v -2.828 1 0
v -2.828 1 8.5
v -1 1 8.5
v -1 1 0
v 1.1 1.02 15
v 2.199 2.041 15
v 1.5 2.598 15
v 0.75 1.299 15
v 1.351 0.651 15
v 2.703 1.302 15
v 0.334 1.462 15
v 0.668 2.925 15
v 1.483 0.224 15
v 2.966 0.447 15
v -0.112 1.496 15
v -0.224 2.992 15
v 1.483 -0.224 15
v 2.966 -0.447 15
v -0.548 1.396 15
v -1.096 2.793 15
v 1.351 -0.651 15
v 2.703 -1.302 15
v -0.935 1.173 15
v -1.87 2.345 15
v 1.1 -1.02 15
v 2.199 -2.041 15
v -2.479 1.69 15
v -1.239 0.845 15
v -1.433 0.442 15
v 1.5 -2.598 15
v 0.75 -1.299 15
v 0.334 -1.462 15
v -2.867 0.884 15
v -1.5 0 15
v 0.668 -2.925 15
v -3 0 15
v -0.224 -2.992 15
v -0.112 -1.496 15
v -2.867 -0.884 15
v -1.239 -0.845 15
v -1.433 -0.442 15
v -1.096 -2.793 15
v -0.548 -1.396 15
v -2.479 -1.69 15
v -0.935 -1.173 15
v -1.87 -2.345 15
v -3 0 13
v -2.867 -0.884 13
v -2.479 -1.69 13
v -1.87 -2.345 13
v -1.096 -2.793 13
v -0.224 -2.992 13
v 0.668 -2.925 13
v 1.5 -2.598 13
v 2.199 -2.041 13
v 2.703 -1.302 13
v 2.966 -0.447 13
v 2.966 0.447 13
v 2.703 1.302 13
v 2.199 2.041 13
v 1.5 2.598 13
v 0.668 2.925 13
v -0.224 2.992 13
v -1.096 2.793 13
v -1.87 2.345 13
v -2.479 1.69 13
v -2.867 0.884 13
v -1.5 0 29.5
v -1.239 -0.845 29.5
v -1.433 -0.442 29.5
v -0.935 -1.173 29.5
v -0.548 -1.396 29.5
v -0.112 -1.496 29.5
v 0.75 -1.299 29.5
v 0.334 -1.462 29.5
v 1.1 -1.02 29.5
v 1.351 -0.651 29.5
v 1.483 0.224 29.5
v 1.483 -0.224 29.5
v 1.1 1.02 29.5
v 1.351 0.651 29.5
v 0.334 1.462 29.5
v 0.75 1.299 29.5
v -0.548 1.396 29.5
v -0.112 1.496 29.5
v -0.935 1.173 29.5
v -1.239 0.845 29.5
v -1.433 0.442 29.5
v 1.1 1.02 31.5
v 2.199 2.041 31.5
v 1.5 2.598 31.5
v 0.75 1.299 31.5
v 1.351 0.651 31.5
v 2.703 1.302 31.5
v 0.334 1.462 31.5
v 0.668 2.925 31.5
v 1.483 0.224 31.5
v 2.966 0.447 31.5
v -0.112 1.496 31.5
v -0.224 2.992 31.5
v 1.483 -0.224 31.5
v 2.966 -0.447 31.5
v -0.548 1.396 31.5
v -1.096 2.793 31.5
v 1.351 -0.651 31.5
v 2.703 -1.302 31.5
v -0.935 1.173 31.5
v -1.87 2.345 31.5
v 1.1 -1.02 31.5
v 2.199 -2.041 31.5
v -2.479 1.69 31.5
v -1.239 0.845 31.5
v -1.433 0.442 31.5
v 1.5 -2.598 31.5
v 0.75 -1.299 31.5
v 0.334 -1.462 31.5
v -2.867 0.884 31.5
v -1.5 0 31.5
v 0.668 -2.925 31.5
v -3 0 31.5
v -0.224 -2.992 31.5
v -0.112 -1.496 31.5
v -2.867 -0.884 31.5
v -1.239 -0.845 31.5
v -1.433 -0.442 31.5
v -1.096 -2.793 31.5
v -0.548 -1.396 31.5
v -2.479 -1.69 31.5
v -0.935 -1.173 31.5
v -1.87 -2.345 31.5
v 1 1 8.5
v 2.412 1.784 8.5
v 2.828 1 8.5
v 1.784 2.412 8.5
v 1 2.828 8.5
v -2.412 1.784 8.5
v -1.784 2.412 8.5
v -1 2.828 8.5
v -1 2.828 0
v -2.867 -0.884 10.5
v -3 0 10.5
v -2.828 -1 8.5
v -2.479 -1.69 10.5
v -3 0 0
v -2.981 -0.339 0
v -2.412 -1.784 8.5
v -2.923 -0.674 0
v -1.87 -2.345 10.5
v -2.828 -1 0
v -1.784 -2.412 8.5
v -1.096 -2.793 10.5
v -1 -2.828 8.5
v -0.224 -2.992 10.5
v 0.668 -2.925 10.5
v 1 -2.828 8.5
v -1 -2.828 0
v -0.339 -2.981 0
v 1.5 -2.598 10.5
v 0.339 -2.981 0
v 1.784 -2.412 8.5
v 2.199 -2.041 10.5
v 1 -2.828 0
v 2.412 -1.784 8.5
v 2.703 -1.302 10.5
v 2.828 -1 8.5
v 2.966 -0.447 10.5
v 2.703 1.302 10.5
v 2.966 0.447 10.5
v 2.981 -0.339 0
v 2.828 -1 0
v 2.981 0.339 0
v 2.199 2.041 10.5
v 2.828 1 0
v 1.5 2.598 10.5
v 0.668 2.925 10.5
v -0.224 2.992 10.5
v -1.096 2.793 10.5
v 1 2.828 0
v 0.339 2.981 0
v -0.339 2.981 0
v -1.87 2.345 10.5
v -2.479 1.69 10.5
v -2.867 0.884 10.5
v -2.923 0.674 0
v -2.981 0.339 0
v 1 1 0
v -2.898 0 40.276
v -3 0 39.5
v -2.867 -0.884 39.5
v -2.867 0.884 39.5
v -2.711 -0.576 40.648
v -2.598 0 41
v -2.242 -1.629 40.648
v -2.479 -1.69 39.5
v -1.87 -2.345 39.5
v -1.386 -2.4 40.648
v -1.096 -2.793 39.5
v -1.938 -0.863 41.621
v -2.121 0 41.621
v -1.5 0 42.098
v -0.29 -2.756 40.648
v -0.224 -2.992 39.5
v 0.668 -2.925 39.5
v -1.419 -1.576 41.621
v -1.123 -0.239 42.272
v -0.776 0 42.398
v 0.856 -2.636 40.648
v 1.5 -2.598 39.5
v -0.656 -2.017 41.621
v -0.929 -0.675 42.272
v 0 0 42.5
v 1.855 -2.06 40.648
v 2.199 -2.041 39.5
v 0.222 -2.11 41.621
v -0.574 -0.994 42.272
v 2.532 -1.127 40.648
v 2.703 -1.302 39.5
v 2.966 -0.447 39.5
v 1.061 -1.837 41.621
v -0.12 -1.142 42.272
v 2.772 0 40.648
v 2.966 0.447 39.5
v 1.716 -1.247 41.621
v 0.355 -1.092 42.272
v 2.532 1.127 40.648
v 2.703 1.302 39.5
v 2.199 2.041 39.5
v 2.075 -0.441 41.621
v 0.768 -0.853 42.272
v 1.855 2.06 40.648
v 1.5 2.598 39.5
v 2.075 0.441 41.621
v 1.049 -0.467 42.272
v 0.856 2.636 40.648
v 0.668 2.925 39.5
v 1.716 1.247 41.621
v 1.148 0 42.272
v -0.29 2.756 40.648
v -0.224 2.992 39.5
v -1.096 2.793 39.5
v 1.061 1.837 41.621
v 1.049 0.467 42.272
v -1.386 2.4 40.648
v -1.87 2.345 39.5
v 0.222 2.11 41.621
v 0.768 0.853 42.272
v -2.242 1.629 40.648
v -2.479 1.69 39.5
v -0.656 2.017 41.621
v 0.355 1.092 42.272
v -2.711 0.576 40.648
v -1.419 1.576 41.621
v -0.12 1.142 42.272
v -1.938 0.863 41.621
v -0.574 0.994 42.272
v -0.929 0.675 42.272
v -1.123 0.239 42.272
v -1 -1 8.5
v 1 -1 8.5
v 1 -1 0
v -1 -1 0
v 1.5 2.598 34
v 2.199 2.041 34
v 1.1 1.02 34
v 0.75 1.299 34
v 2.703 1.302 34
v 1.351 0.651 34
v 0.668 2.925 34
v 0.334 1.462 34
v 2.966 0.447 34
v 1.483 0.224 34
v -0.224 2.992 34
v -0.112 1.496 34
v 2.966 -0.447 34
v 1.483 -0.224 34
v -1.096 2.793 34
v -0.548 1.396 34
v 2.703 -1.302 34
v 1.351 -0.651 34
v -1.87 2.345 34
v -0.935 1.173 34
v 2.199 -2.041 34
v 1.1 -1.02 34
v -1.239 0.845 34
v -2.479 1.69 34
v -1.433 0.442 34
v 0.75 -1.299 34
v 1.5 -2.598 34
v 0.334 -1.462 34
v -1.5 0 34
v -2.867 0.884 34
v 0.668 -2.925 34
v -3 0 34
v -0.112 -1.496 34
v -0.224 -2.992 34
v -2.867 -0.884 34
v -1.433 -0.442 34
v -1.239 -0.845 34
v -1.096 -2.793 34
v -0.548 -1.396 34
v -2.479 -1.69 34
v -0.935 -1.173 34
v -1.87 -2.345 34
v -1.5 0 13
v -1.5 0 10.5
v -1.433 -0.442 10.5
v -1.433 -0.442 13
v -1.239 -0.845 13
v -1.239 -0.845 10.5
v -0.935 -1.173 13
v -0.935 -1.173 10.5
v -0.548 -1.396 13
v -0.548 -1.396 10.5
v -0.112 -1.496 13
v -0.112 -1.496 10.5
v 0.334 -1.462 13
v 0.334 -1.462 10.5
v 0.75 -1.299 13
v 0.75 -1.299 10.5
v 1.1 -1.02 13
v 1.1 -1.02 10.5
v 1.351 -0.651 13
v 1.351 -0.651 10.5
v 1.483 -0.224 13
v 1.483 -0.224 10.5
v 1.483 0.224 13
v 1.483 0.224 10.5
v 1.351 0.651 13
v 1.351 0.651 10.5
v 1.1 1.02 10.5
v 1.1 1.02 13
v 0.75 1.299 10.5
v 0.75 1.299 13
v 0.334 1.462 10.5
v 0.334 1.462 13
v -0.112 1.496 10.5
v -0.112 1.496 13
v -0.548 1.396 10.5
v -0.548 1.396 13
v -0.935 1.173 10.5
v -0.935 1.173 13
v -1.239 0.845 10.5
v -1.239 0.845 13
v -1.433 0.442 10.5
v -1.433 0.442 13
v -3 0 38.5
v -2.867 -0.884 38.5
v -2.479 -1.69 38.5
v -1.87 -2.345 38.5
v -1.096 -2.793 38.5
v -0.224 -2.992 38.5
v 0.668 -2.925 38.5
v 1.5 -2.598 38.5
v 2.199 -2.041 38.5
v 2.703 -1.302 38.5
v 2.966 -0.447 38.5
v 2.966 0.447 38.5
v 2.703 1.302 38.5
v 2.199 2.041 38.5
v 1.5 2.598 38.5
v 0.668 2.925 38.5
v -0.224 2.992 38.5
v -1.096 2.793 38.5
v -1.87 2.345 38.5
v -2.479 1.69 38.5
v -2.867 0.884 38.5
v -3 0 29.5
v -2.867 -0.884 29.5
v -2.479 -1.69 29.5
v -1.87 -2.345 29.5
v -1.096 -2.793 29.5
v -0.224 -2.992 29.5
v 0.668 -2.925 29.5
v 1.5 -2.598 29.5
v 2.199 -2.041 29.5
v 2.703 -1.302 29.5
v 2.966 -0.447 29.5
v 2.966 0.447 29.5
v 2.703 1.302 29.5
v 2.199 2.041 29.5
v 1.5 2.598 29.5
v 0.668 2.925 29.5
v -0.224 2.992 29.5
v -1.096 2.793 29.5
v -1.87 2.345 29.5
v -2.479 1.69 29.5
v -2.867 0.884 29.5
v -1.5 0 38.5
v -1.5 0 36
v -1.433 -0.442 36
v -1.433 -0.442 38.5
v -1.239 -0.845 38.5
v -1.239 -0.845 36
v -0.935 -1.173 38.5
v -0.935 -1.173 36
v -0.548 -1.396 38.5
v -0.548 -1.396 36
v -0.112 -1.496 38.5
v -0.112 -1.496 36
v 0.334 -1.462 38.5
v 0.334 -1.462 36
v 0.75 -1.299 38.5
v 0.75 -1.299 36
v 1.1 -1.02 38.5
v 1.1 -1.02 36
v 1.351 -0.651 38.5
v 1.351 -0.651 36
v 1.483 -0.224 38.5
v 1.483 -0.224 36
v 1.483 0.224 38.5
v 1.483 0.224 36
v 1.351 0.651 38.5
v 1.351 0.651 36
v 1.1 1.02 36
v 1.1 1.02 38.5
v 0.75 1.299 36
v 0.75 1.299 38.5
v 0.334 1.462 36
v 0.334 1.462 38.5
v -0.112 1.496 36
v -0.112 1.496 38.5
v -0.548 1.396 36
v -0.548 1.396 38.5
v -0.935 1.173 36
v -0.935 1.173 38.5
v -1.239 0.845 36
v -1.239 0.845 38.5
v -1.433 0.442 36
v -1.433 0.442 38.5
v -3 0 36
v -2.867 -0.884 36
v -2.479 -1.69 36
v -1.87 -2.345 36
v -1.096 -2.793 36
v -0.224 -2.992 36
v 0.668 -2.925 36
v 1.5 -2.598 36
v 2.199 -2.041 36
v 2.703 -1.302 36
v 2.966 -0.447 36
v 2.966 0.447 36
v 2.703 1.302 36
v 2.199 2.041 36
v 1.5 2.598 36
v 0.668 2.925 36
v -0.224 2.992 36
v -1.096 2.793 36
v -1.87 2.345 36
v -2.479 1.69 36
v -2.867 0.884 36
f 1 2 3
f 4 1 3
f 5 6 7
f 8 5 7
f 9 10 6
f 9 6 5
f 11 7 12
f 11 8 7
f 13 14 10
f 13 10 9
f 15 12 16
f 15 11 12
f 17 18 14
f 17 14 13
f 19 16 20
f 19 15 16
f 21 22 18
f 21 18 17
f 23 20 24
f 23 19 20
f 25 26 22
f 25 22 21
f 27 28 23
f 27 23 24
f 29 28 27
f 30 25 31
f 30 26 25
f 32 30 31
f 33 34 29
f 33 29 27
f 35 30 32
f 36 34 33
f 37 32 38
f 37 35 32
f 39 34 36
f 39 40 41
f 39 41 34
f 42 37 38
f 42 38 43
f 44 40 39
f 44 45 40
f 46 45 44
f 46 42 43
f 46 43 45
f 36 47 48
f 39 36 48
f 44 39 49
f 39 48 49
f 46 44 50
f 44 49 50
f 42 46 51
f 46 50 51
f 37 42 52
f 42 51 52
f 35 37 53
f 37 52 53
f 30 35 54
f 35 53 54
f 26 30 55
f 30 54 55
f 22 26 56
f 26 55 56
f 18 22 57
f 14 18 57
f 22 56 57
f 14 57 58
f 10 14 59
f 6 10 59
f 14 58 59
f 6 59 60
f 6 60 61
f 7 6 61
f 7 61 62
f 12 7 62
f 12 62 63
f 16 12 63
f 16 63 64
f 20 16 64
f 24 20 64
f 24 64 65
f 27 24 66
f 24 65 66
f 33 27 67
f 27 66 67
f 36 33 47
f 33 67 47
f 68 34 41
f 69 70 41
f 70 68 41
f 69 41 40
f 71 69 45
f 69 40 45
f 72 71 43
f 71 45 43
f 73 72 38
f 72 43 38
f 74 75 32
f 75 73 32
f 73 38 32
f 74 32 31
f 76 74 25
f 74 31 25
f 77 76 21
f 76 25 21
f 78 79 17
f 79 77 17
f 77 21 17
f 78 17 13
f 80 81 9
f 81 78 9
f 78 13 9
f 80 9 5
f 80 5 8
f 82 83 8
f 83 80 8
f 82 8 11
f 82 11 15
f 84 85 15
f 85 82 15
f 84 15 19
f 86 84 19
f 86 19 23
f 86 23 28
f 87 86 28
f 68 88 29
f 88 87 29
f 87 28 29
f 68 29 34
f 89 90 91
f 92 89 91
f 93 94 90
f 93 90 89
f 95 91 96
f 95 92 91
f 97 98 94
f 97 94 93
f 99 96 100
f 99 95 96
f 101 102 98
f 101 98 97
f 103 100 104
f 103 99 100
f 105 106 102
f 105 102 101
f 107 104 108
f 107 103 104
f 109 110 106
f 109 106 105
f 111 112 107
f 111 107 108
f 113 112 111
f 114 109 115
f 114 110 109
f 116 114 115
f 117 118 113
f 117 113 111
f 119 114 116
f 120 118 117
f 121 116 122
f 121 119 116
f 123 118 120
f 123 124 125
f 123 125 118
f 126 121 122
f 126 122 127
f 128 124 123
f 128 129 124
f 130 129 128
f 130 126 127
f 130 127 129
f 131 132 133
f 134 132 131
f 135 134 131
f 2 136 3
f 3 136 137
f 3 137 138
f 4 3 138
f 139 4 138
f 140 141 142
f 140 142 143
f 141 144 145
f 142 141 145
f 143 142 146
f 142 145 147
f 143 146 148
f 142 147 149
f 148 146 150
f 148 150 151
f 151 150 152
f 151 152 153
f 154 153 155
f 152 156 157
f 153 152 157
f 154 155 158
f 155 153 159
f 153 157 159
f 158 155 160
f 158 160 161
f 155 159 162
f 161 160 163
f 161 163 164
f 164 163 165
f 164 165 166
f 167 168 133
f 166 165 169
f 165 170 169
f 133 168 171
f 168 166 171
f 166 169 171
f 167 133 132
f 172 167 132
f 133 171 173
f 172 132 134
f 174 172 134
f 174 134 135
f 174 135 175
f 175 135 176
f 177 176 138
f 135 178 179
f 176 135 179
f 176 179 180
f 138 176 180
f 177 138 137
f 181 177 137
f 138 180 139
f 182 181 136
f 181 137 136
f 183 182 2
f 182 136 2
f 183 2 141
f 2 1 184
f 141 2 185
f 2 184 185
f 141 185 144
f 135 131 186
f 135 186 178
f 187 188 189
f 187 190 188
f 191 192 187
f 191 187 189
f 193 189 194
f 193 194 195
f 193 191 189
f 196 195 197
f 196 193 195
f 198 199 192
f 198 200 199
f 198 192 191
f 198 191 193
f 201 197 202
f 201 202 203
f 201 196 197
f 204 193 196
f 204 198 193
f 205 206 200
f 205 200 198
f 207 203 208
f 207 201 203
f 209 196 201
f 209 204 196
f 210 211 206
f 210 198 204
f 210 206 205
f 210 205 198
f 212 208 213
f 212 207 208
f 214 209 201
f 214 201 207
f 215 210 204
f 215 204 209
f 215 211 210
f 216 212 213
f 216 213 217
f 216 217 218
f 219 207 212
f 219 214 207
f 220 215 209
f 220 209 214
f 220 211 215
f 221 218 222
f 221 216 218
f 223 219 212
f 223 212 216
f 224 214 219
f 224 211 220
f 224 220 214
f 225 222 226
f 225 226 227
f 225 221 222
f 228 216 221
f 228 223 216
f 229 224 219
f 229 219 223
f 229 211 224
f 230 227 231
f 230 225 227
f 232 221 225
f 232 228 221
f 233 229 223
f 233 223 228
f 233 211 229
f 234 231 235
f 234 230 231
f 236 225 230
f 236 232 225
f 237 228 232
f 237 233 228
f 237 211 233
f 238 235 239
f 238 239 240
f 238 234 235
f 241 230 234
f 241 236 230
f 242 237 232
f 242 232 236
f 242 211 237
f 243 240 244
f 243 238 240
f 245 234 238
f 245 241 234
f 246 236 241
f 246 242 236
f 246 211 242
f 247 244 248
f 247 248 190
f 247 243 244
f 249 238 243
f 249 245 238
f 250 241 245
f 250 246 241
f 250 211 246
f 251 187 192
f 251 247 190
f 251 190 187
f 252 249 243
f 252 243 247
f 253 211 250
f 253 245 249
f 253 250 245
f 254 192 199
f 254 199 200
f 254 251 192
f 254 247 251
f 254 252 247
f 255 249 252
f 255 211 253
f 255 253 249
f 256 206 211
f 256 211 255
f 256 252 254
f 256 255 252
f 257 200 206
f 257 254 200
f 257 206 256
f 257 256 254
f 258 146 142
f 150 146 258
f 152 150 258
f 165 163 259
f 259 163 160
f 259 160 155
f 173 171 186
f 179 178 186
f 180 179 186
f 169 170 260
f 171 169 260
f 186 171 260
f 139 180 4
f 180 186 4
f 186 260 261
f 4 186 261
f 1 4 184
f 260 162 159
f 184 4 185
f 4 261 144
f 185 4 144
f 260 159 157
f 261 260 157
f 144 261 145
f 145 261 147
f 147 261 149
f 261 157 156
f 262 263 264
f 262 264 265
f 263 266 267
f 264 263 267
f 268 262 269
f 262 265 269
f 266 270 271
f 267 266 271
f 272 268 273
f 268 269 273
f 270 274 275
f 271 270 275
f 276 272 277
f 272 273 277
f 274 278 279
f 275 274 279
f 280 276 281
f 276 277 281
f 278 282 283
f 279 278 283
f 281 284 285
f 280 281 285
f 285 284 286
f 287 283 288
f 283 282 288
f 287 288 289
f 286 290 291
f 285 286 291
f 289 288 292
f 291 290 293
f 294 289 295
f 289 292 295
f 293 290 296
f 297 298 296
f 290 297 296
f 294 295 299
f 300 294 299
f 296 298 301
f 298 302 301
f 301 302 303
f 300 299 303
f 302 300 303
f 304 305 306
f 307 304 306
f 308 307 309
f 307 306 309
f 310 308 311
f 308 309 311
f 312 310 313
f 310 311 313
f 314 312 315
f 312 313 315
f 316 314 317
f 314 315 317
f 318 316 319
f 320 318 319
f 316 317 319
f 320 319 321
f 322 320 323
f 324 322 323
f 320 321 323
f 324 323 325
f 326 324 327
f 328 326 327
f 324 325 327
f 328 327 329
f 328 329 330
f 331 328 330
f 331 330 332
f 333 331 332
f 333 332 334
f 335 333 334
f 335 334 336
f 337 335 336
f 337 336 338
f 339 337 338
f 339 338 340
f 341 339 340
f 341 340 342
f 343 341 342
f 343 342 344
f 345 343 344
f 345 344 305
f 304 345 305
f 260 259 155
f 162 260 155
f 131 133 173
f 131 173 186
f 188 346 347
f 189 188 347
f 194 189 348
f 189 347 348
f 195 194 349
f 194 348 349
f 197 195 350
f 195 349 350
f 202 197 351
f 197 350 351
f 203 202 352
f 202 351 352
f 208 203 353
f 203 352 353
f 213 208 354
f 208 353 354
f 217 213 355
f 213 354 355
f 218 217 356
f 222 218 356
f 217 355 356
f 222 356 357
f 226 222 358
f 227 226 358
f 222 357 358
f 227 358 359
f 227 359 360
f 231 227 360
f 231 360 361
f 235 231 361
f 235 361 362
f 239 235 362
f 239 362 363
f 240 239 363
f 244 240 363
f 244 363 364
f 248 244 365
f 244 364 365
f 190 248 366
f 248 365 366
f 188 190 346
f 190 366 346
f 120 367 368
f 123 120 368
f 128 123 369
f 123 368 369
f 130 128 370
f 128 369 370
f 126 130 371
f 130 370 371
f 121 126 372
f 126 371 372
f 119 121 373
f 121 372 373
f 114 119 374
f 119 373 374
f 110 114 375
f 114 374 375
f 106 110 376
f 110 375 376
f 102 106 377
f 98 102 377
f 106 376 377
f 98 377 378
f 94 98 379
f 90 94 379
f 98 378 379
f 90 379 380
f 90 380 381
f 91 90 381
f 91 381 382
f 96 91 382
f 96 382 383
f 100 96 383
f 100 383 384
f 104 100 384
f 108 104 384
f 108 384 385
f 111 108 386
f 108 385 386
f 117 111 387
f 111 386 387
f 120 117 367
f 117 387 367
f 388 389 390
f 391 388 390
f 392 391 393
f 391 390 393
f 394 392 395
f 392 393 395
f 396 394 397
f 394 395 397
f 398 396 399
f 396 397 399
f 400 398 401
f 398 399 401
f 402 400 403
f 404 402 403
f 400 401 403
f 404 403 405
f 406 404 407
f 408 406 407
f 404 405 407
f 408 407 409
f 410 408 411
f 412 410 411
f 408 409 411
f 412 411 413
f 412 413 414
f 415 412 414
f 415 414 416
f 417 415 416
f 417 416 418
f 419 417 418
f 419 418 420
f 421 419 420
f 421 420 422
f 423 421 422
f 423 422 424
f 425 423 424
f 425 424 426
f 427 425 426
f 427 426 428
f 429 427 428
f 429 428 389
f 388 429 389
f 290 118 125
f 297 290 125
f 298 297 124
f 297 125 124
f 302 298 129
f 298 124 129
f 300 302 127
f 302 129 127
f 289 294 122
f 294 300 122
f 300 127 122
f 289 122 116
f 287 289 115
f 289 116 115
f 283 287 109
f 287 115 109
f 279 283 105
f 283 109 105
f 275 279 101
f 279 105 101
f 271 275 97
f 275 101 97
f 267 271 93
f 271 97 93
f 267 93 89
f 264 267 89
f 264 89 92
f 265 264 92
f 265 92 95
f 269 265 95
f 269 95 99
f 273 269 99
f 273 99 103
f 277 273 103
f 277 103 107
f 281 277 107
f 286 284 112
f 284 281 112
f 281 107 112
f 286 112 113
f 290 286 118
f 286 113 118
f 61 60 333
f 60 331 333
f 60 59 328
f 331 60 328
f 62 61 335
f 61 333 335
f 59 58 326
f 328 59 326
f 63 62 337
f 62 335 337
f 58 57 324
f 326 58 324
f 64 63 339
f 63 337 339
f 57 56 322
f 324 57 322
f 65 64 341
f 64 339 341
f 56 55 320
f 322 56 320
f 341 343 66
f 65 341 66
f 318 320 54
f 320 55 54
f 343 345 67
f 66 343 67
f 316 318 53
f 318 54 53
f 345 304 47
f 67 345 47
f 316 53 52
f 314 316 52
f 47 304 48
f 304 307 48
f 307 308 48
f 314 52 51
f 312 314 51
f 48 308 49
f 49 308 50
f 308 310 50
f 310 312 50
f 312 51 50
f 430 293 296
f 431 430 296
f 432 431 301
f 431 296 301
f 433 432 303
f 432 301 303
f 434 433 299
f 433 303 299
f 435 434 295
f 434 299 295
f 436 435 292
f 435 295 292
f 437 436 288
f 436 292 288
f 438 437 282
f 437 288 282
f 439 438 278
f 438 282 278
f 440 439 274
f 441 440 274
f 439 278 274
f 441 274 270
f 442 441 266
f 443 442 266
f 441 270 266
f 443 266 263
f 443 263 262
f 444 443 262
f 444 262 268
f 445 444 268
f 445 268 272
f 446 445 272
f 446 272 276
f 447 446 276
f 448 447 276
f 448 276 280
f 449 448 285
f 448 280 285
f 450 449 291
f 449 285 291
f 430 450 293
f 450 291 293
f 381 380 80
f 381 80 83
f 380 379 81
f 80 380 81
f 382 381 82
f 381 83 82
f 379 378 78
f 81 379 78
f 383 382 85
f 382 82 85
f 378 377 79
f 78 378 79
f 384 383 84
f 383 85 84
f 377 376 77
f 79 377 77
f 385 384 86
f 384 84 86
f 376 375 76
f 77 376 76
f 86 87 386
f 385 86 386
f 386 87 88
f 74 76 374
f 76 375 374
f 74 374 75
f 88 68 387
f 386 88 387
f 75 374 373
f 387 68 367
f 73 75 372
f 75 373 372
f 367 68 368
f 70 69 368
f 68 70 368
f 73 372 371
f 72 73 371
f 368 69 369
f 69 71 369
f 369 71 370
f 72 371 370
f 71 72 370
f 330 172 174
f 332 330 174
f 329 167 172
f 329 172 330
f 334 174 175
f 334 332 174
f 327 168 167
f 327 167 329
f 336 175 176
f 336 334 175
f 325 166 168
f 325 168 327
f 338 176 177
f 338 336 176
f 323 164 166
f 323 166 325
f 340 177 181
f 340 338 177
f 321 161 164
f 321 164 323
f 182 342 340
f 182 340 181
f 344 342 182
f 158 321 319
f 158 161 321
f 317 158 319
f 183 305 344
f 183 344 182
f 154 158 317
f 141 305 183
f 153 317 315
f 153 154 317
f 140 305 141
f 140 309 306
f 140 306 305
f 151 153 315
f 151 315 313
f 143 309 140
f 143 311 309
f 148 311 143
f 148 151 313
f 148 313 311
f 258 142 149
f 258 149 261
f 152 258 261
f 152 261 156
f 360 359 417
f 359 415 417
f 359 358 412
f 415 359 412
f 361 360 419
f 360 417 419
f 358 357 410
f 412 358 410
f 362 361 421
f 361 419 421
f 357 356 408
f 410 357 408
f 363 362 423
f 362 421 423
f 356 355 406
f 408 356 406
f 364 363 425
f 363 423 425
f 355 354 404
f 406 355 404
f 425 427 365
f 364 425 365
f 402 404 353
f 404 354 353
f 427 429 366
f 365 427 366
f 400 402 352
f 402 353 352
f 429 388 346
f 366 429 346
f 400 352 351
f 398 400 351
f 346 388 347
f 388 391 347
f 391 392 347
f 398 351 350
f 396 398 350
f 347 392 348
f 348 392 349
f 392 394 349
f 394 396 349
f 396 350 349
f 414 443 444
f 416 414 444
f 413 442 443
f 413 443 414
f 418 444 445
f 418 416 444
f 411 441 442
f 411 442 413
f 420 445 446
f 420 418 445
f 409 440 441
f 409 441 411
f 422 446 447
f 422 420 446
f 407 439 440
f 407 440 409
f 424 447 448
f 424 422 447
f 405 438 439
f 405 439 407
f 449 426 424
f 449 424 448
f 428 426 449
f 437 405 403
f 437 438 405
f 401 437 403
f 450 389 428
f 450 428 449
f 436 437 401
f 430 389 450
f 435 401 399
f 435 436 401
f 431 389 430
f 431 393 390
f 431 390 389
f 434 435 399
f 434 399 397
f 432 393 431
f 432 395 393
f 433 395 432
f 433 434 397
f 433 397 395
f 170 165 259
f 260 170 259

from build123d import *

# Parameters (mm, degrees)
SKETCH_1_R                                = 3
EXTRUDE_1_DEPTH                           = 10.5
SKETCH_3_R                                = 1.5
EXTRUDE_2_DEPTH                           = 13
SKETCH_4_R                                = 3
EXTRUDE_3_DEPTH                           = 2
SKETCH_5_R                                = 1.5
EXTRUDE_4_DEPTH                           = 38.5
EXTRUDE_START                             = 29.5
SKETCH_7_R                                = 3
EXTRUDE_5_DEPTH                           = 2
EXTRUDE_START_2                           = 34
SKETCH_8_R                                = 3
EXTRUDE_6_DEPTH                           = 2
SKETCH_9_R                                = 3
EXTRUDE_7_DEPTH                           = 4
FILLET_1_R                                = 3
CUT_EXTRUDE_START                         = -8.5
CUT_EXTRUDE_1_DEPTH                       = 52.211239739
MIRROR_START                              = -8.5
MIRROR_2_AT_THE_SECOND_PLANE_COPY_1_DEPTH = 52.211239739


with BuildPart() as part:
    # 草图1 → 凸台-拉伸1 (new body)
    with BuildSketch(Plane.XY):
        with Locations(Location((0, 0, 0), (0, 0, 180))):
            Circle(SKETCH_1_R)
    extrude(amount=EXTRUDE_1_DEPTH)

    # 草图3 → 凸台-拉伸2 (add)
    with BuildSketch(Plane.XY):
        with Locations(Location((0, 0, 0), (0, 0, 180))):
            Circle(SKETCH_3_R)
    extrude(amount=EXTRUDE_2_DEPTH)

    # 草图4 → 凸台-拉伸3 (add)
    with BuildSketch(Plane.XY.offset(13)):
        with Locations(Location((0, 0, 0), (0, 0, 180))):
            Circle(SKETCH_4_R)
    extrude(amount=EXTRUDE_3_DEPTH)

    # 草图5 → 凸台-拉伸4 (add)
    with BuildSketch(Plane.XY):
        with Locations(Location((0, 0, 0), (0, 0, 180))):
            Circle(SKETCH_5_R)
    extrude(amount=EXTRUDE_4_DEPTH)

    # 草图7 → 凸台-拉伸5 (add)
    with BuildSketch(Plane.XY.offset(EXTRUDE_START)):
        with Locations(Location((0, 0, 0), (0, 0, 180))):
            Circle(SKETCH_7_R)
    extrude(amount=EXTRUDE_5_DEPTH)

    # 草图8 → 凸台-拉伸6 (add)
    with BuildSketch(Plane.XY.offset(EXTRUDE_START_2)):
        with Locations(Location((0, 0, 0), (0, 0, 180))):
            Circle(SKETCH_8_R)
    extrude(amount=EXTRUDE_6_DEPTH)

    # 草图9 → 凸台-拉伸7 (add)
    with BuildSketch(Plane.XY.offset(38.5)):
        with Locations(Location((0, 0, 0), (0, 0, 180))):
            Circle(SKETCH_9_R)
    extrude(amount=EXTRUDE_7_DEPTH)

    # 圆角1
    fillet_1_edges = [part.edges().sort_by_distance(p)[0] for p in [
        (3, 0, 42.5),
    ]]
    fillet(fillet_1_edges, radius=FILLET_1_R)

    # 草图10 → 切除-拉伸1 (cut)
    with BuildSketch(Plane(origin=(0, 0, 0), x_dir=(-1, 0, 0), z_dir=(0, 0, -1)).offset(CUT_EXTRUDE_START)):
        Polygon((-26.96639908, 1), (-2.828427125, 1), (-1, 1), (-1, 2.828427125), (-1, 26.96639908), (-35.136247307, 61.102646386), (-61.102646386, 35.136247307), align=None)
    cut_extrude_1 = extrude(amount=CUT_EXTRUDE_1_DEPTH, mode=Mode.SUBTRACT)

    # 镜向2: 切除-拉伸1 across plane
    add(cut_extrude_1.mirror(Plane.ZX), mode=Mode.SUBTRACT)

    # 镜向2 at the second plane: 切除-拉伸1 across plane
    add(cut_extrude_1.mirror(Plane(origin=(0, 0, 0), x_dir=(0, 0, 1), z_dir=(1, 0, 0))), mode=Mode.SUBTRACT)

    # 镜向2 at the second plane copy 1 sket → 镜向2 at the second plane copy 1 (cut)
    with BuildSketch(Plane(origin=(0, 0, 0), x_dir=(1, 0, 0), z_dir=(0, 0, -1)).offset(MIRROR_START)):
        Polygon((-26.96639908, 1), (-2.828427125, 1), (-1, 1), (-1, 2.828427125), (-1, 26.96639908), (-35.136247307, 61.102646386), (-61.102646386, 35.136247307), align=None)
    extrude(amount=MIRROR_2_AT_THE_SECOND_PLANE_COPY_1_DEPTH, mode=Mode.SUBTRACT)


solid = part.part
